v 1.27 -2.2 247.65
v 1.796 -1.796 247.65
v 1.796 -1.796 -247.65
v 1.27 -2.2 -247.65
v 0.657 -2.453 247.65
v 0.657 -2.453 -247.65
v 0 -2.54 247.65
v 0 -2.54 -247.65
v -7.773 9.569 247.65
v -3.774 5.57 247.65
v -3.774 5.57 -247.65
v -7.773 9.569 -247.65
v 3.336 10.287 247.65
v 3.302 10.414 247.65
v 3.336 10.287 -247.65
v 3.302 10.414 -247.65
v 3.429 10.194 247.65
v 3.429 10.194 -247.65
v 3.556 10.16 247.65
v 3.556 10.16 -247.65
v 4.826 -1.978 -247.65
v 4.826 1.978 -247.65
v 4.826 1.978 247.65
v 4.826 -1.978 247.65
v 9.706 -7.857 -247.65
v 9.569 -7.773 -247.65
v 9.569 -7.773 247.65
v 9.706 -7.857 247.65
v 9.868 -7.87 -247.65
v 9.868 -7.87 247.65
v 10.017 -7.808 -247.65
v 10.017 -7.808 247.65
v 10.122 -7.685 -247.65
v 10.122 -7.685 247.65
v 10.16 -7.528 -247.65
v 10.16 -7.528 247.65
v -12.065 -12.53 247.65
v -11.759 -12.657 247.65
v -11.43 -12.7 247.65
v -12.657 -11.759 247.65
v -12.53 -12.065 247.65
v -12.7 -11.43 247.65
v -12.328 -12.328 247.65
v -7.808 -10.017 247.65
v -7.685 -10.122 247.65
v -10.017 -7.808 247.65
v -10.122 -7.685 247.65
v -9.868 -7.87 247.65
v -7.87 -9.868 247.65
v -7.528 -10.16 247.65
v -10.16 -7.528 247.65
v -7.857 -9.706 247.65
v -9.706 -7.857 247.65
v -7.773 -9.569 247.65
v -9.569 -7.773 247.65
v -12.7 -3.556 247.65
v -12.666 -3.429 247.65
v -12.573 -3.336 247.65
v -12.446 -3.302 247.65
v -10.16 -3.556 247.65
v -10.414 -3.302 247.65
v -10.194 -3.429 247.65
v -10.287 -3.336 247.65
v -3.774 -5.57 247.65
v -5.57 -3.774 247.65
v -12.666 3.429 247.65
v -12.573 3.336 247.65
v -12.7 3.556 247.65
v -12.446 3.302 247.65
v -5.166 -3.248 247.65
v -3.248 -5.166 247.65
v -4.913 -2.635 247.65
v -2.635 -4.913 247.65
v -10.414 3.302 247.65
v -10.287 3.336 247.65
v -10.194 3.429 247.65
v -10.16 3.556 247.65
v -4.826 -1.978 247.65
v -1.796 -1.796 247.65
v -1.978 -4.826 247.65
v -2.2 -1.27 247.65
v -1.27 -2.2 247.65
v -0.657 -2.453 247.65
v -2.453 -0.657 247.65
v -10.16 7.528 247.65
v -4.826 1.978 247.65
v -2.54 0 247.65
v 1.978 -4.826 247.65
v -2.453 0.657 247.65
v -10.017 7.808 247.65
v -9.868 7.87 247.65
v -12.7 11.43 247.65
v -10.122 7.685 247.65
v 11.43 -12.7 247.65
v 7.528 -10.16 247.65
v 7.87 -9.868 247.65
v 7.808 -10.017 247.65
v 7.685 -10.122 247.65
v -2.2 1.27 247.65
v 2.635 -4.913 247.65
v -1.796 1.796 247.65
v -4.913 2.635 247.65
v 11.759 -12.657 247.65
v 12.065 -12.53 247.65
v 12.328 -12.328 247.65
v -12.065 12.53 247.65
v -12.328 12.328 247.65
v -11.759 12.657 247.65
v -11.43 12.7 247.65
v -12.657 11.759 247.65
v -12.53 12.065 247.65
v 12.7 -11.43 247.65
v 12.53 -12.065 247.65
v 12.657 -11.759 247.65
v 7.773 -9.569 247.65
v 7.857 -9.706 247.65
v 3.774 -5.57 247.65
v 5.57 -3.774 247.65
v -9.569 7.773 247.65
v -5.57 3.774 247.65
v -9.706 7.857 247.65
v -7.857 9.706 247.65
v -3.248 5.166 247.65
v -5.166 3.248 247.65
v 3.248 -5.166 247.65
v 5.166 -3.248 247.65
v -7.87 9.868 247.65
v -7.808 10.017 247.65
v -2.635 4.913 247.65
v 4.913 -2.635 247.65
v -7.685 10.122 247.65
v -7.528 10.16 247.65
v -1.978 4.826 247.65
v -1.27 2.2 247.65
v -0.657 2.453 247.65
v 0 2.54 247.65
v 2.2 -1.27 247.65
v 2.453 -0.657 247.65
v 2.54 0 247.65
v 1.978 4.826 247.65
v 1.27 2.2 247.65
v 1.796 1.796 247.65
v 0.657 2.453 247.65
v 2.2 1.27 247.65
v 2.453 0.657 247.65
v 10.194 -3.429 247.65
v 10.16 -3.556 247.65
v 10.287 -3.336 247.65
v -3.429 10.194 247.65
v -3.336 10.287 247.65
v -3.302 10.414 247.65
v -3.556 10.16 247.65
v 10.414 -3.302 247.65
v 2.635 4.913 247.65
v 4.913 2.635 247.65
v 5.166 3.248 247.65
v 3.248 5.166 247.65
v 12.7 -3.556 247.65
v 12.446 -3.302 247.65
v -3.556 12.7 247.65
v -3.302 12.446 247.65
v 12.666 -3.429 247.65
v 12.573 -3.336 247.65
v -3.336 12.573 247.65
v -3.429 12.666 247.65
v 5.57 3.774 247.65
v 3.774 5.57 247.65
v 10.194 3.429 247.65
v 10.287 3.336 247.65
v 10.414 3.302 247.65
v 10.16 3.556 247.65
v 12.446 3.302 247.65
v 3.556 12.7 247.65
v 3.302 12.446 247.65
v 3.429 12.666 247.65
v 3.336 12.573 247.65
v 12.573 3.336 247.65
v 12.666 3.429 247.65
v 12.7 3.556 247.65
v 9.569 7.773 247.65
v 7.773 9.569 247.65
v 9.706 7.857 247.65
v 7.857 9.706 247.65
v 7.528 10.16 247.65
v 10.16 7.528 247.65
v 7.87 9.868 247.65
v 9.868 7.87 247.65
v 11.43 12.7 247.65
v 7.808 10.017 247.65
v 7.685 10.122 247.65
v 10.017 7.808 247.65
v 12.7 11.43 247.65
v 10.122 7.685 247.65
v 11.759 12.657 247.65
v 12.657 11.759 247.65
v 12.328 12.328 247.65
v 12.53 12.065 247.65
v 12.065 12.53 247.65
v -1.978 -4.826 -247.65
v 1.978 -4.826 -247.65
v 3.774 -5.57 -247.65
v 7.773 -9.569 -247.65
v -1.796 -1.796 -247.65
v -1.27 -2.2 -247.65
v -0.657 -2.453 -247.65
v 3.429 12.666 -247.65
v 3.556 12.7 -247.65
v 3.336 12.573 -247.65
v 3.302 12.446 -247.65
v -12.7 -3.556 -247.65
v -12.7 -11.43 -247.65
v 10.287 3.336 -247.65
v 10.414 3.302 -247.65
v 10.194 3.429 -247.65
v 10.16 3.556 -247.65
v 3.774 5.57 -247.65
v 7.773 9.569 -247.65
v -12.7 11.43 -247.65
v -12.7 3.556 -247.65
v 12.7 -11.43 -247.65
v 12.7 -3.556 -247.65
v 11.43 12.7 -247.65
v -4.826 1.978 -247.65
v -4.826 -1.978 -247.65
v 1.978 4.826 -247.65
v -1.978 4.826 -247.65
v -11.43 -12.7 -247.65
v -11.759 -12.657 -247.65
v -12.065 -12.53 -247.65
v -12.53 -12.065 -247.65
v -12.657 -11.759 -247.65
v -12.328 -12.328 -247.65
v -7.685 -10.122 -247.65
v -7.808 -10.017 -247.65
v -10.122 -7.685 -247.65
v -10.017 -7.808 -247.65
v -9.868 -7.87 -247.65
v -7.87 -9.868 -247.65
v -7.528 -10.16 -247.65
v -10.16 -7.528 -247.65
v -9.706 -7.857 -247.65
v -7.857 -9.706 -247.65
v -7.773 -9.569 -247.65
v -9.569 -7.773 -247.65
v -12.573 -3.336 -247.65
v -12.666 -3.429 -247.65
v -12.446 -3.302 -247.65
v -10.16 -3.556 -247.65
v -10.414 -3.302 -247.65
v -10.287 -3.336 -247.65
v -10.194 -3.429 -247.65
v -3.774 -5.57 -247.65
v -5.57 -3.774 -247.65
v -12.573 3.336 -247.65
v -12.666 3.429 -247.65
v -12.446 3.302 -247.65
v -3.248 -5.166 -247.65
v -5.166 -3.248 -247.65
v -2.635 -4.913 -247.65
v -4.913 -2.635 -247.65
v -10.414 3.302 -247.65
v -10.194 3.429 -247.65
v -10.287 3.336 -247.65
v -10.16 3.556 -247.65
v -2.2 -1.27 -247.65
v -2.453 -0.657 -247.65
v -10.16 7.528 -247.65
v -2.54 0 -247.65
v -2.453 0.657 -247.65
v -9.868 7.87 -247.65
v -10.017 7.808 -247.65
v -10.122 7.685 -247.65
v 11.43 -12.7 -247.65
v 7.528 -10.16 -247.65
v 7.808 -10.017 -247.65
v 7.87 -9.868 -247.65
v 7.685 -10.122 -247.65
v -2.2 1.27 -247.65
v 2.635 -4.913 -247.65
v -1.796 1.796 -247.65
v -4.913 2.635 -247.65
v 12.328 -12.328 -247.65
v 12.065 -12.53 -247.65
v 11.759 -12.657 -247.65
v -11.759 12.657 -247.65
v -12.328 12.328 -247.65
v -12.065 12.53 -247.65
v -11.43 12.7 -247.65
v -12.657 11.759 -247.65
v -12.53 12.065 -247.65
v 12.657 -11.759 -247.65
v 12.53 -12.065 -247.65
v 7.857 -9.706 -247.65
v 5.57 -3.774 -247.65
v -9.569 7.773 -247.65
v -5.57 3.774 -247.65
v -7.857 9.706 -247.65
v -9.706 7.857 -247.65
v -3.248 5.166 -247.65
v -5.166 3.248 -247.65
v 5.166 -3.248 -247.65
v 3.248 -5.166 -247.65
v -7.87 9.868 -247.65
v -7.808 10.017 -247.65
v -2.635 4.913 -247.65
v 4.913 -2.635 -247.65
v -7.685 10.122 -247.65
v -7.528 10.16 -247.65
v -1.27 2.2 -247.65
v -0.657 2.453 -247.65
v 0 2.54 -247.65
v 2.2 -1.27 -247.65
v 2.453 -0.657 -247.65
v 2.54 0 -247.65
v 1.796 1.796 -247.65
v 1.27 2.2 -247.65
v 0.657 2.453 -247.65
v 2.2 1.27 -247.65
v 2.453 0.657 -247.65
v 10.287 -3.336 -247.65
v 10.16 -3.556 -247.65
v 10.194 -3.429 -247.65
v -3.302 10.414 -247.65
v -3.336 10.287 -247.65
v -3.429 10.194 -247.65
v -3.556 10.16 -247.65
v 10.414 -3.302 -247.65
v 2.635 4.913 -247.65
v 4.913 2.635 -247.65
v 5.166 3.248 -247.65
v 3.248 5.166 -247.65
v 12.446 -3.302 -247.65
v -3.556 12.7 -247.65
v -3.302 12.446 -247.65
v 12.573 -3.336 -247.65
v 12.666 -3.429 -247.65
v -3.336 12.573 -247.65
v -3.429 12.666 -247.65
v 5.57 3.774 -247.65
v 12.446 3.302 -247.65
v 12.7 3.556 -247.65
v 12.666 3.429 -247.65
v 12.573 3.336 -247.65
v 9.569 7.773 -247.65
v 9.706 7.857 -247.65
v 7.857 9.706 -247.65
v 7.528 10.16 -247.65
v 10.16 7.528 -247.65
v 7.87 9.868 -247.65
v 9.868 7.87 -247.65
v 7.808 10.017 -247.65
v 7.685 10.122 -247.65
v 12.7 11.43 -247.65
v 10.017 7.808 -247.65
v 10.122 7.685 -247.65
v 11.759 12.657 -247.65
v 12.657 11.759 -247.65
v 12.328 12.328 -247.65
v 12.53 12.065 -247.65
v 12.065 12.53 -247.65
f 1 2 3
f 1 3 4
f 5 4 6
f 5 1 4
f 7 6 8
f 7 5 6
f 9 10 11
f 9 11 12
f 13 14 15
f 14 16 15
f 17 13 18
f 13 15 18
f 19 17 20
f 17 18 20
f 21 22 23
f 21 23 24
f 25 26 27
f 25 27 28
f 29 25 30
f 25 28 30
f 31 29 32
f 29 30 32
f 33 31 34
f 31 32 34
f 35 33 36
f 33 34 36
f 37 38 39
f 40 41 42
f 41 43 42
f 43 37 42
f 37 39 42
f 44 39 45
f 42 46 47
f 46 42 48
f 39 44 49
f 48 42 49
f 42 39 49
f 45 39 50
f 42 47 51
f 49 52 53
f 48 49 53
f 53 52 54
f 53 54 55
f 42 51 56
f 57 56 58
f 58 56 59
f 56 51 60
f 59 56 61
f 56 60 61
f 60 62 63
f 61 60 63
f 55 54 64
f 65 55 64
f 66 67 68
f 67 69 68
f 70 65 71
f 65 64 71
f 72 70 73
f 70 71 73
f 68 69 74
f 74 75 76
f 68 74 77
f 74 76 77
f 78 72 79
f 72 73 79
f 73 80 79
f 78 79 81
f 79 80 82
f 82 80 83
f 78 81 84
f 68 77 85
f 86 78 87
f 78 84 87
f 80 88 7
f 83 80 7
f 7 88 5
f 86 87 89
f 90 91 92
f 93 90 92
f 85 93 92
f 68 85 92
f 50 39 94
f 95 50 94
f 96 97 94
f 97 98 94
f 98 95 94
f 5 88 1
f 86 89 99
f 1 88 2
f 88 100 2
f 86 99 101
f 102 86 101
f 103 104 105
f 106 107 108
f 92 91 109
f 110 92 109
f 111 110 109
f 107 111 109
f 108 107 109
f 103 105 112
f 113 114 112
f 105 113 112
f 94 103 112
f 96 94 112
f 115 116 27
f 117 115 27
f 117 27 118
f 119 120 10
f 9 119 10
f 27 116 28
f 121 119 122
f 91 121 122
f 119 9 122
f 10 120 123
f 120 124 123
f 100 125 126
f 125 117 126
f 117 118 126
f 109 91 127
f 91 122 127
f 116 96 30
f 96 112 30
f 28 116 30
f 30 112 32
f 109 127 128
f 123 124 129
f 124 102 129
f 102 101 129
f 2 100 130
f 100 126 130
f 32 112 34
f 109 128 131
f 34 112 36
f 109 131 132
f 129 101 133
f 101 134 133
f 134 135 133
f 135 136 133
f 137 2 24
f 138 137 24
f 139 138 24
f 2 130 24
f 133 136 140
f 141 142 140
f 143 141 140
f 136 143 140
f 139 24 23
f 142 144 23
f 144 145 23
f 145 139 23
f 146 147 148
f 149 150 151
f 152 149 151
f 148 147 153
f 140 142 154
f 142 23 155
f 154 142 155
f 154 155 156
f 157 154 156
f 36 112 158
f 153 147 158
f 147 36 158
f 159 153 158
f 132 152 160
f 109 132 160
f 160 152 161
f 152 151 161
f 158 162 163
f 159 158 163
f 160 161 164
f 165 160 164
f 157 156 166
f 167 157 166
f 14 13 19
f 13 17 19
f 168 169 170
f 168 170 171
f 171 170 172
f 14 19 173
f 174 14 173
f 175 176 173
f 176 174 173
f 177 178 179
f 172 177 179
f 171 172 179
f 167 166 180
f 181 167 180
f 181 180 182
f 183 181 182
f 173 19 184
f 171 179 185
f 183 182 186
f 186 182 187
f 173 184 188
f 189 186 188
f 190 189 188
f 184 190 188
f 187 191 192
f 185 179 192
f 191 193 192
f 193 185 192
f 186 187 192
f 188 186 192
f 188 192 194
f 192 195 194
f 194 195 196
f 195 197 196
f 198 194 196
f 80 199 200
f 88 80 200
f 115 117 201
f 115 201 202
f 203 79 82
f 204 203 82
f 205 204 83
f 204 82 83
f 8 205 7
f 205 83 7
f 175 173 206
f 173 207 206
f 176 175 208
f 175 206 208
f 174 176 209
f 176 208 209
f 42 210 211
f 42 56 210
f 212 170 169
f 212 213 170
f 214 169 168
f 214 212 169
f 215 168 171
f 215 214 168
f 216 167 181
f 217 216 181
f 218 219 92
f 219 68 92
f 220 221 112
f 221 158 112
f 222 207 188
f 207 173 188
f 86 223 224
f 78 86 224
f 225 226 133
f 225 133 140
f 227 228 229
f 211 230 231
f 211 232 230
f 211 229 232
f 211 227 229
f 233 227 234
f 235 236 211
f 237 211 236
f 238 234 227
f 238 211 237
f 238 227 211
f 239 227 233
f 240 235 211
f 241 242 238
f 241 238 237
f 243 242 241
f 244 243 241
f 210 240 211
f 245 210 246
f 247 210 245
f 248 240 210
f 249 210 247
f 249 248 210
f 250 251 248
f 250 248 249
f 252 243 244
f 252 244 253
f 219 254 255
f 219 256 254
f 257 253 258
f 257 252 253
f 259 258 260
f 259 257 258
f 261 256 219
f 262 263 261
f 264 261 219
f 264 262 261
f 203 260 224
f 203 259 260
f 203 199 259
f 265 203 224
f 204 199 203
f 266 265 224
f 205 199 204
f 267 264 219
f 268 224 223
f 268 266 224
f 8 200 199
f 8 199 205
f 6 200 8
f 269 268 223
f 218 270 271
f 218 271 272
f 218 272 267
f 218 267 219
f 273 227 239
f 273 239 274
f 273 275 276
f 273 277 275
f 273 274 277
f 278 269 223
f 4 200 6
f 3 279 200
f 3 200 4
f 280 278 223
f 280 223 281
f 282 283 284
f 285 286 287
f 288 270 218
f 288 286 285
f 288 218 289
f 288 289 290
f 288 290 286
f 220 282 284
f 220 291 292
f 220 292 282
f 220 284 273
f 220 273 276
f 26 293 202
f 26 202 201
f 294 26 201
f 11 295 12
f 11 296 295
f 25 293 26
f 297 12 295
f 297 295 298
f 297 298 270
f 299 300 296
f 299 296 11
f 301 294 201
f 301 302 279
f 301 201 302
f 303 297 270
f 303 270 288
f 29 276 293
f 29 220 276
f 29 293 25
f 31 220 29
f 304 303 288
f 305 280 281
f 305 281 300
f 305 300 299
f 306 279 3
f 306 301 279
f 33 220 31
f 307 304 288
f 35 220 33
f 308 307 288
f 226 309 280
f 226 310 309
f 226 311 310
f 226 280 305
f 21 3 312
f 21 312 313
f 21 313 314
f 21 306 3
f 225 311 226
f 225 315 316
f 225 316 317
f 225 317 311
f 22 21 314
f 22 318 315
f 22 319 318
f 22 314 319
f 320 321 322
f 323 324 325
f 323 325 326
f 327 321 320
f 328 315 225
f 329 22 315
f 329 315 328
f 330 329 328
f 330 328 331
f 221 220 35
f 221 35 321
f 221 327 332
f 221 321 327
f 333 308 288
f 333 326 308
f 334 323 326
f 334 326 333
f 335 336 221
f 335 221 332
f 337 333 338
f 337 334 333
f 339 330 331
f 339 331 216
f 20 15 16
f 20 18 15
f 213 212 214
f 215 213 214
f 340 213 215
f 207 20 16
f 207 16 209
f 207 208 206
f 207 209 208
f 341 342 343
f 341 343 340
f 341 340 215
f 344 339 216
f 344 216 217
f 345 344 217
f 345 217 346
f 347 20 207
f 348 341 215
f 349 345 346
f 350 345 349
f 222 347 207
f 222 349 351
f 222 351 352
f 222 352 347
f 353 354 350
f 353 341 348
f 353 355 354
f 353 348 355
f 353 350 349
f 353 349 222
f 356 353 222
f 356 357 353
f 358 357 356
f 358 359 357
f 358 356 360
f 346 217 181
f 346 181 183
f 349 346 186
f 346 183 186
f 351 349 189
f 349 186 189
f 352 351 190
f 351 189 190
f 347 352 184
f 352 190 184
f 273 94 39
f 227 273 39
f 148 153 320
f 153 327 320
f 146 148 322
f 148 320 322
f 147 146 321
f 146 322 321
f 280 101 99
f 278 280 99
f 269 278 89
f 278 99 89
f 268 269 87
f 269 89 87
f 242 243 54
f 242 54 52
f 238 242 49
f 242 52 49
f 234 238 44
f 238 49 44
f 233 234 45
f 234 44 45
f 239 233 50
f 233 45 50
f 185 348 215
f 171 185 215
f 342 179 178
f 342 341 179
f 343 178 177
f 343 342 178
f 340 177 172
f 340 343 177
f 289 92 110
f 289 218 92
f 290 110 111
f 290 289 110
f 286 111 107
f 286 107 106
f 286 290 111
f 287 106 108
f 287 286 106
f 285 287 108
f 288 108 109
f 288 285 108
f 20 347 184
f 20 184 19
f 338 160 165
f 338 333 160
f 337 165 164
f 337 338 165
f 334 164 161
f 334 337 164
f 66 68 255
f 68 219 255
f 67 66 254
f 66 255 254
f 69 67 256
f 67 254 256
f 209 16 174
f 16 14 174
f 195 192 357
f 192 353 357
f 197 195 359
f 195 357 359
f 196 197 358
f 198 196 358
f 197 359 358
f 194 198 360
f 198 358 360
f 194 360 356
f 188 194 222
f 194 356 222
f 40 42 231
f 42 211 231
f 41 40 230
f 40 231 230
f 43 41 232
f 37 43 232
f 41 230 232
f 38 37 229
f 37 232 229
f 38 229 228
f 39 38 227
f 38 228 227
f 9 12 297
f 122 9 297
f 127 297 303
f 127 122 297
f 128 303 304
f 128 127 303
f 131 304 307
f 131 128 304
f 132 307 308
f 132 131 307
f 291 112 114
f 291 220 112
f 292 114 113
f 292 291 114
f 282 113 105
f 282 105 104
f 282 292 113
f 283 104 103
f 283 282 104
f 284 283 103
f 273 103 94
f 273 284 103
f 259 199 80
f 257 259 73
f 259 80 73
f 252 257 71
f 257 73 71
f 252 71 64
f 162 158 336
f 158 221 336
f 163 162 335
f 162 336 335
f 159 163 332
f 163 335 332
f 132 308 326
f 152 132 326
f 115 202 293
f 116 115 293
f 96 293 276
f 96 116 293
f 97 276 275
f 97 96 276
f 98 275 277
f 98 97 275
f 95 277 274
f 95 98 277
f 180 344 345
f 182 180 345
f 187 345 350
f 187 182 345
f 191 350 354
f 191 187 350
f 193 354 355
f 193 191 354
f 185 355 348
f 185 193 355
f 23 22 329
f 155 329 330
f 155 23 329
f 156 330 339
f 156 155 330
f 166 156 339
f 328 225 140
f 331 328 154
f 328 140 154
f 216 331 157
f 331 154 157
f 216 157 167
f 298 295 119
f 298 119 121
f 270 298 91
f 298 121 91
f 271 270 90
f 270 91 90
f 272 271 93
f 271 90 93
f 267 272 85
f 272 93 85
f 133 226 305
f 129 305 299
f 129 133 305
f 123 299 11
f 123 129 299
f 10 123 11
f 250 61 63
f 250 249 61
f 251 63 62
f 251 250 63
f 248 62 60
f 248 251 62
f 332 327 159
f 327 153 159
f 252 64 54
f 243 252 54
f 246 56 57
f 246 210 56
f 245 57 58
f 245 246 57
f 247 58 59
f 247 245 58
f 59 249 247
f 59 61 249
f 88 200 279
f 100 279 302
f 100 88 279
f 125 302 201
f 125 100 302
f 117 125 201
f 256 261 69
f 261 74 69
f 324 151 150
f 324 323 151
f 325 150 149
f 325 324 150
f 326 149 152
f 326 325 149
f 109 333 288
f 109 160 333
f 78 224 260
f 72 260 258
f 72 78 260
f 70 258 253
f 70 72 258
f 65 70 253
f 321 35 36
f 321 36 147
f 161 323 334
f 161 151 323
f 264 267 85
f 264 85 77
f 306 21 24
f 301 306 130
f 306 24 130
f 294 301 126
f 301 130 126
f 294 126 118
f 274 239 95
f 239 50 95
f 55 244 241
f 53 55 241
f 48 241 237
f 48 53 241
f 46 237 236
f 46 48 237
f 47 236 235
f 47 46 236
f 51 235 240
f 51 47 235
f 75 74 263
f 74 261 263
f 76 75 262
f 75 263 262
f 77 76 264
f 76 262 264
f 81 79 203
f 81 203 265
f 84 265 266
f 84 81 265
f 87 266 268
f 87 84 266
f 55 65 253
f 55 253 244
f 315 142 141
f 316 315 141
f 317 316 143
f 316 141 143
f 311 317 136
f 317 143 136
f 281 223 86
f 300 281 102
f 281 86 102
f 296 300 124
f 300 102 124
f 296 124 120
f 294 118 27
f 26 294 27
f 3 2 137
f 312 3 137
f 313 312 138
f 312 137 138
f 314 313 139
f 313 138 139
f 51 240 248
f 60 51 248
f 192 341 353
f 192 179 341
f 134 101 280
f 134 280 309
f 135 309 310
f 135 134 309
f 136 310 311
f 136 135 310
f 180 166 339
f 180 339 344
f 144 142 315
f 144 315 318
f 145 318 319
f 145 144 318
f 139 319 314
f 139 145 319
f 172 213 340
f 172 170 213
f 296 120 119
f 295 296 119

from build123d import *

# Parameters (mm, degrees)
BOSS_EXTRUDE1_DEPTH = 247.65
FILLET2_R           = 0.254
FILLET1_R           = 1.27
SKETCH5_W           = 7.112
SKETCH5_H           = 2.54
BOSS_EXTRUDE2_DEPTH = 495.3


with BuildPart() as part:
    # Sketch3 → Boss-Extrude1 (new body, symmetric)
    with BuildSketch(Plane.XY):
        with BuildLine():
            Line((-12.7, 12.7), (-1.796051224, 1.796051224))
            ThreePointArc((-1.796051224, 1.796051224), (-0.972015918, 2.346654013), (0, 2.54))
            Line((0, 2.54), (0, 4.826))
            Line((0, 4.826), (-1.977846327, 4.826))
            ThreePointArc((-1.977846327, 4.826), (-2.949862246, 5.019345987), (-3.773897552, 5.569948776))
            Line((-3.773897552, 5.569948776), (-7.772528286, 9.56857951))
            ThreePointArc((-7.772528286, 9.56857951), (-7.847628361, 9.946133082), (-7.527553898, 10.16))
            Line((-7.527553898, 10.16), (-3.302, 10.16))
            Line((-3.302, 10.16), (-3.302, 12.7))
            Line((-3.302, 12.7), (-12.7, 12.7))
        make_face()
    extrude(amount=BOSS_EXTRUDE1_DEPTH, both=True)

    # Fillet2
    fillet2_edges = [part.edges().sort_by_distance(p)[0] for p in [
        (-3.302, 12.7, 0),
        (-3.302, 10.16, 0),
    ]]
    fillet(fillet2_edges, radius=FILLET2_R)

    # Mirror1: part across plane


with BuildPart() as part_1:
    add(part.part)
    add(part.part.mirror(Plane(origin=(0, 0, 247.65), x_dir=(0, 0, 1), z_dir=(0.707106781, 0.707106781, 0))))

    # Fillet1
    fillet1_edges = [part_1.edges().sort_by_distance(p)[0] for p in [
        (-12.7, 12.7, 0),
    ]]
    fillet(fillet1_edges, radius=FILLET1_R)

    # Mirror2: part across plane


with BuildPart() as part_2:
    add(part_1.part)
    add(part_1.part.mirror(Plane(origin=(0, 0, 247.65), x_dir=(0, 0, 1), z_dir=(0, 1, 0))))

    # Mirror5: part across plane


with BuildPart() as part_3:
    add(part_2.part)
    add(part_2.part.mirror(Plane(origin=(0, 0, 247.65), x_dir=(0, 0, 1), z_dir=(-1, 0, 0))))

    # Sketch5 → Boss-Extrude2 (add, through all)
    with BuildSketch(Plane.XY.offset(247.65)):
        with Locations((0, -11.43)):
            Rectangle(SKETCH5_W, SKETCH5_H)
    extrude(amount=-BOSS_EXTRUDE2_DEPTH)


solid = part_3.part
